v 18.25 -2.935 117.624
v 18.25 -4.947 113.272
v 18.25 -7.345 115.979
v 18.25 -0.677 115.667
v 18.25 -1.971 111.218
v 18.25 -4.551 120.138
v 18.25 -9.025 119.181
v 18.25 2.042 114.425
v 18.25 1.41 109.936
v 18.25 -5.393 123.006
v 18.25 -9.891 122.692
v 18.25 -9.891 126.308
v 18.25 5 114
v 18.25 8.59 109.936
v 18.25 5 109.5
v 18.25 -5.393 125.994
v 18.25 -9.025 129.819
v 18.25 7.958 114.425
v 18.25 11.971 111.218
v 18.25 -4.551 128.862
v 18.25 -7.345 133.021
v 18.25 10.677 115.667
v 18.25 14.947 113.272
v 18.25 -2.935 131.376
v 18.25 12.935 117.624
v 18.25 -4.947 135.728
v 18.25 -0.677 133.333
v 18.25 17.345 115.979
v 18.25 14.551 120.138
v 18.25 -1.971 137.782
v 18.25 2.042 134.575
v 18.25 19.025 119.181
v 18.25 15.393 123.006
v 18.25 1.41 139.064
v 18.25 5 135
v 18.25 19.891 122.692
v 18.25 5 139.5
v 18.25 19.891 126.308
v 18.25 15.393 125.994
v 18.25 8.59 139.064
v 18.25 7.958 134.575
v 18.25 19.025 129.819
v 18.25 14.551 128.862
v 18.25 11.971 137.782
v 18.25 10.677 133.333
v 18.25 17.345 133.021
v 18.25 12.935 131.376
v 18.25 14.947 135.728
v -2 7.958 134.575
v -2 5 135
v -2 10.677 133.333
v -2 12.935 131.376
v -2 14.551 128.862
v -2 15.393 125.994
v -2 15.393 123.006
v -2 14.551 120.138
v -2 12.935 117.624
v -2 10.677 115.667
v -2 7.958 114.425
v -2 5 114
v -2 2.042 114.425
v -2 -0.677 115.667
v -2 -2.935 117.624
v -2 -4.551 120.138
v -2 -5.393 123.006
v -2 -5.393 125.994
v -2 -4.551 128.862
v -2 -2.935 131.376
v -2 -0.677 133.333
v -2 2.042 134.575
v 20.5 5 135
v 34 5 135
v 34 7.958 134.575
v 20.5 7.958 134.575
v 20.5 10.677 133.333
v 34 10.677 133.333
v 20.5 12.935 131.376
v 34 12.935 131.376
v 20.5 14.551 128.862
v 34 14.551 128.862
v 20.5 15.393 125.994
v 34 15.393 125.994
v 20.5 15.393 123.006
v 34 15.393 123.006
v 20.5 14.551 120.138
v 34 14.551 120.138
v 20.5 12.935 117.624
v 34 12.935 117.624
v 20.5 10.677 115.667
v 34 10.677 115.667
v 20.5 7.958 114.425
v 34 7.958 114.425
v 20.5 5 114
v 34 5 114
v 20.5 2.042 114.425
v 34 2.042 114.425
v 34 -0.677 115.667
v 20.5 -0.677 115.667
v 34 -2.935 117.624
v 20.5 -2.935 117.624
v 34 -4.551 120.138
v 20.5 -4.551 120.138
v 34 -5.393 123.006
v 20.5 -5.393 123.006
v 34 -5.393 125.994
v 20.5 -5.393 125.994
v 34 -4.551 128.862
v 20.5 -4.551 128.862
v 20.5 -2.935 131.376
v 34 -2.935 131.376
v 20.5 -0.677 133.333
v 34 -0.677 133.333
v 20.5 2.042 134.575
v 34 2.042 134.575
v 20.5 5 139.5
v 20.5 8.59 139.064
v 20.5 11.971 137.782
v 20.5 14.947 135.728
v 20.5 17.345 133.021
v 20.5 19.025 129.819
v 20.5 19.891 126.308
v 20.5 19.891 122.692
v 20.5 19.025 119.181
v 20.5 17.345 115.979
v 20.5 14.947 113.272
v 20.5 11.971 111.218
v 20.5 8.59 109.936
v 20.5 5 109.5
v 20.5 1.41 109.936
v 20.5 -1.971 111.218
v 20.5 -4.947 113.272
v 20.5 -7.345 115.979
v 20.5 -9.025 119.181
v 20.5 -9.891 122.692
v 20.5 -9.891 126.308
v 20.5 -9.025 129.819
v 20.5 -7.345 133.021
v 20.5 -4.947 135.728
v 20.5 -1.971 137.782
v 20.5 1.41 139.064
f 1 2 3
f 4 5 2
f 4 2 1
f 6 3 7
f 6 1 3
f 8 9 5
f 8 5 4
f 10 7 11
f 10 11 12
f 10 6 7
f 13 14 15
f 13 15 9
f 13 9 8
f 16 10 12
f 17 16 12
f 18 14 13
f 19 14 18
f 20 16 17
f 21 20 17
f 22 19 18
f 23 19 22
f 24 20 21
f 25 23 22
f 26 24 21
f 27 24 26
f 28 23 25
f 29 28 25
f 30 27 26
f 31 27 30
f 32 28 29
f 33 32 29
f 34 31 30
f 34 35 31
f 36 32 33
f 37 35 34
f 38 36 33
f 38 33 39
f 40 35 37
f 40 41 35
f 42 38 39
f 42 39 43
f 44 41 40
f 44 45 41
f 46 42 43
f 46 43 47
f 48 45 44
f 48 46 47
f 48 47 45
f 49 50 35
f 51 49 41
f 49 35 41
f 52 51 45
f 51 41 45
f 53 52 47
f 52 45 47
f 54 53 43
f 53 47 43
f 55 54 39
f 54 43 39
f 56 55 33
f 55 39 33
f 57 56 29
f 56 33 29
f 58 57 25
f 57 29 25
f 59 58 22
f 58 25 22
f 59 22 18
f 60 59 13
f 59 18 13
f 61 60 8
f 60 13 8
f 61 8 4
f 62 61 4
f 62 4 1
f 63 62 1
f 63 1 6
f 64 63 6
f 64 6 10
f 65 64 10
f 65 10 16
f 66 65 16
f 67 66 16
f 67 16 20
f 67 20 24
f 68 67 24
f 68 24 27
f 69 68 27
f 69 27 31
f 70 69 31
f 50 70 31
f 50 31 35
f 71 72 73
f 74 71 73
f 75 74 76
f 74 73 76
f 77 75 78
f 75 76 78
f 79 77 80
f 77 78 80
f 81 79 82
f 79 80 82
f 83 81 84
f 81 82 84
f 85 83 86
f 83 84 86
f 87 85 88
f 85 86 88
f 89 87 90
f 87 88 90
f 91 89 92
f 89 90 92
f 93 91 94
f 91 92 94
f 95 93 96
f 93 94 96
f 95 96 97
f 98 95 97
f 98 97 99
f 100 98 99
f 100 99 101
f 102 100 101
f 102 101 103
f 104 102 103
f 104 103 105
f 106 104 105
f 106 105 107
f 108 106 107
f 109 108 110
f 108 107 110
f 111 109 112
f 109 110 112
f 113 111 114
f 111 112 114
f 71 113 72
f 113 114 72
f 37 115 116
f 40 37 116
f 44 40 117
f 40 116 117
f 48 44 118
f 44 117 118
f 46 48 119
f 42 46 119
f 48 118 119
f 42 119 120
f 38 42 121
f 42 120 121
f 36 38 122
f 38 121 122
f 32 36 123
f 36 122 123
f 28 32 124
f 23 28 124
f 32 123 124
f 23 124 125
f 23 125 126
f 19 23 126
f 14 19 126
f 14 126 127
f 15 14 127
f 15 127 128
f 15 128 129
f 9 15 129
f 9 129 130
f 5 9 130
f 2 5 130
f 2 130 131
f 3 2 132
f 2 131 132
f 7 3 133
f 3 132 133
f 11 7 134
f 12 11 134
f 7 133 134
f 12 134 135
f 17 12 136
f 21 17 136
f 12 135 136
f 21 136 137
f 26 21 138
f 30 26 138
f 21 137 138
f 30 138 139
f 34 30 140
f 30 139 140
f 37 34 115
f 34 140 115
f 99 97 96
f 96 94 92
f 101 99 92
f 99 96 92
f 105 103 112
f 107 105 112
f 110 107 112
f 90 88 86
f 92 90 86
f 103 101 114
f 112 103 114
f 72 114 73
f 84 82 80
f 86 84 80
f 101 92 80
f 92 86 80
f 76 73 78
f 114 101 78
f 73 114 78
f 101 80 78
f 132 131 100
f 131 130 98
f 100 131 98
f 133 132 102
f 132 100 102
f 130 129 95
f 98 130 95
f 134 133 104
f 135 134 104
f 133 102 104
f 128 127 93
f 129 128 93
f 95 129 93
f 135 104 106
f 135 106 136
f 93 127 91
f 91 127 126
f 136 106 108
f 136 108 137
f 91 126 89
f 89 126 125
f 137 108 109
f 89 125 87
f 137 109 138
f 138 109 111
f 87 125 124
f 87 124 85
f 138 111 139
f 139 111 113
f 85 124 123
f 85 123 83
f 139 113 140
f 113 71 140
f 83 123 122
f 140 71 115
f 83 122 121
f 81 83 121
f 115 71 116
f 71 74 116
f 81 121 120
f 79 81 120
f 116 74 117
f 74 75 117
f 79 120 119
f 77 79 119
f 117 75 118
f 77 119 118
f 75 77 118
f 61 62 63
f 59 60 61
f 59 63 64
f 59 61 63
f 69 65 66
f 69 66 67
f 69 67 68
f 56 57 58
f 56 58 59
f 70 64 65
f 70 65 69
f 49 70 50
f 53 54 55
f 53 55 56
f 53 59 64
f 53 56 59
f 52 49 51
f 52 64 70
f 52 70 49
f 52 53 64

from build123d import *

# Parameters (mm, degrees)
CYLINDER101_R             = 15
CYLINDER101_DEPTH         = 2.25
CYLINDER100_R             = 10.5
CYLINDER100_DEPTH         = 36
FUSION030_PLACEMENT_ANGLE = 90


with BuildPart() as ethernet003:
    # Cylinder101 → Cylinder101 (new body)
    with BuildSketch(Plane.XY.offset(13.5)):
        Circle(CYLINDER101_R)
    extrude(amount=CYLINDER101_DEPTH)


with BuildPart() as ethenet001:
    # Cylinder100 → Cylinder100 (new body)
    with BuildSketch(Plane.XY):
        Circle(CYLINDER100_R)
    extrude(amount=CYLINDER100_DEPTH)

    # Fusion030: union Ethernet003
    add(ethernet003.part)


with BuildPart() as ethenet001_1:
    # Fusion030 placement: moved
    add(ethenet001.part.moved(Location((34, 5, 124.5))).rotate(Axis((34, 5, 124.5), (0, -1, 0)), FUSION030_PLACEMENT_ANGLE))


solid = ethenet001_1.part
